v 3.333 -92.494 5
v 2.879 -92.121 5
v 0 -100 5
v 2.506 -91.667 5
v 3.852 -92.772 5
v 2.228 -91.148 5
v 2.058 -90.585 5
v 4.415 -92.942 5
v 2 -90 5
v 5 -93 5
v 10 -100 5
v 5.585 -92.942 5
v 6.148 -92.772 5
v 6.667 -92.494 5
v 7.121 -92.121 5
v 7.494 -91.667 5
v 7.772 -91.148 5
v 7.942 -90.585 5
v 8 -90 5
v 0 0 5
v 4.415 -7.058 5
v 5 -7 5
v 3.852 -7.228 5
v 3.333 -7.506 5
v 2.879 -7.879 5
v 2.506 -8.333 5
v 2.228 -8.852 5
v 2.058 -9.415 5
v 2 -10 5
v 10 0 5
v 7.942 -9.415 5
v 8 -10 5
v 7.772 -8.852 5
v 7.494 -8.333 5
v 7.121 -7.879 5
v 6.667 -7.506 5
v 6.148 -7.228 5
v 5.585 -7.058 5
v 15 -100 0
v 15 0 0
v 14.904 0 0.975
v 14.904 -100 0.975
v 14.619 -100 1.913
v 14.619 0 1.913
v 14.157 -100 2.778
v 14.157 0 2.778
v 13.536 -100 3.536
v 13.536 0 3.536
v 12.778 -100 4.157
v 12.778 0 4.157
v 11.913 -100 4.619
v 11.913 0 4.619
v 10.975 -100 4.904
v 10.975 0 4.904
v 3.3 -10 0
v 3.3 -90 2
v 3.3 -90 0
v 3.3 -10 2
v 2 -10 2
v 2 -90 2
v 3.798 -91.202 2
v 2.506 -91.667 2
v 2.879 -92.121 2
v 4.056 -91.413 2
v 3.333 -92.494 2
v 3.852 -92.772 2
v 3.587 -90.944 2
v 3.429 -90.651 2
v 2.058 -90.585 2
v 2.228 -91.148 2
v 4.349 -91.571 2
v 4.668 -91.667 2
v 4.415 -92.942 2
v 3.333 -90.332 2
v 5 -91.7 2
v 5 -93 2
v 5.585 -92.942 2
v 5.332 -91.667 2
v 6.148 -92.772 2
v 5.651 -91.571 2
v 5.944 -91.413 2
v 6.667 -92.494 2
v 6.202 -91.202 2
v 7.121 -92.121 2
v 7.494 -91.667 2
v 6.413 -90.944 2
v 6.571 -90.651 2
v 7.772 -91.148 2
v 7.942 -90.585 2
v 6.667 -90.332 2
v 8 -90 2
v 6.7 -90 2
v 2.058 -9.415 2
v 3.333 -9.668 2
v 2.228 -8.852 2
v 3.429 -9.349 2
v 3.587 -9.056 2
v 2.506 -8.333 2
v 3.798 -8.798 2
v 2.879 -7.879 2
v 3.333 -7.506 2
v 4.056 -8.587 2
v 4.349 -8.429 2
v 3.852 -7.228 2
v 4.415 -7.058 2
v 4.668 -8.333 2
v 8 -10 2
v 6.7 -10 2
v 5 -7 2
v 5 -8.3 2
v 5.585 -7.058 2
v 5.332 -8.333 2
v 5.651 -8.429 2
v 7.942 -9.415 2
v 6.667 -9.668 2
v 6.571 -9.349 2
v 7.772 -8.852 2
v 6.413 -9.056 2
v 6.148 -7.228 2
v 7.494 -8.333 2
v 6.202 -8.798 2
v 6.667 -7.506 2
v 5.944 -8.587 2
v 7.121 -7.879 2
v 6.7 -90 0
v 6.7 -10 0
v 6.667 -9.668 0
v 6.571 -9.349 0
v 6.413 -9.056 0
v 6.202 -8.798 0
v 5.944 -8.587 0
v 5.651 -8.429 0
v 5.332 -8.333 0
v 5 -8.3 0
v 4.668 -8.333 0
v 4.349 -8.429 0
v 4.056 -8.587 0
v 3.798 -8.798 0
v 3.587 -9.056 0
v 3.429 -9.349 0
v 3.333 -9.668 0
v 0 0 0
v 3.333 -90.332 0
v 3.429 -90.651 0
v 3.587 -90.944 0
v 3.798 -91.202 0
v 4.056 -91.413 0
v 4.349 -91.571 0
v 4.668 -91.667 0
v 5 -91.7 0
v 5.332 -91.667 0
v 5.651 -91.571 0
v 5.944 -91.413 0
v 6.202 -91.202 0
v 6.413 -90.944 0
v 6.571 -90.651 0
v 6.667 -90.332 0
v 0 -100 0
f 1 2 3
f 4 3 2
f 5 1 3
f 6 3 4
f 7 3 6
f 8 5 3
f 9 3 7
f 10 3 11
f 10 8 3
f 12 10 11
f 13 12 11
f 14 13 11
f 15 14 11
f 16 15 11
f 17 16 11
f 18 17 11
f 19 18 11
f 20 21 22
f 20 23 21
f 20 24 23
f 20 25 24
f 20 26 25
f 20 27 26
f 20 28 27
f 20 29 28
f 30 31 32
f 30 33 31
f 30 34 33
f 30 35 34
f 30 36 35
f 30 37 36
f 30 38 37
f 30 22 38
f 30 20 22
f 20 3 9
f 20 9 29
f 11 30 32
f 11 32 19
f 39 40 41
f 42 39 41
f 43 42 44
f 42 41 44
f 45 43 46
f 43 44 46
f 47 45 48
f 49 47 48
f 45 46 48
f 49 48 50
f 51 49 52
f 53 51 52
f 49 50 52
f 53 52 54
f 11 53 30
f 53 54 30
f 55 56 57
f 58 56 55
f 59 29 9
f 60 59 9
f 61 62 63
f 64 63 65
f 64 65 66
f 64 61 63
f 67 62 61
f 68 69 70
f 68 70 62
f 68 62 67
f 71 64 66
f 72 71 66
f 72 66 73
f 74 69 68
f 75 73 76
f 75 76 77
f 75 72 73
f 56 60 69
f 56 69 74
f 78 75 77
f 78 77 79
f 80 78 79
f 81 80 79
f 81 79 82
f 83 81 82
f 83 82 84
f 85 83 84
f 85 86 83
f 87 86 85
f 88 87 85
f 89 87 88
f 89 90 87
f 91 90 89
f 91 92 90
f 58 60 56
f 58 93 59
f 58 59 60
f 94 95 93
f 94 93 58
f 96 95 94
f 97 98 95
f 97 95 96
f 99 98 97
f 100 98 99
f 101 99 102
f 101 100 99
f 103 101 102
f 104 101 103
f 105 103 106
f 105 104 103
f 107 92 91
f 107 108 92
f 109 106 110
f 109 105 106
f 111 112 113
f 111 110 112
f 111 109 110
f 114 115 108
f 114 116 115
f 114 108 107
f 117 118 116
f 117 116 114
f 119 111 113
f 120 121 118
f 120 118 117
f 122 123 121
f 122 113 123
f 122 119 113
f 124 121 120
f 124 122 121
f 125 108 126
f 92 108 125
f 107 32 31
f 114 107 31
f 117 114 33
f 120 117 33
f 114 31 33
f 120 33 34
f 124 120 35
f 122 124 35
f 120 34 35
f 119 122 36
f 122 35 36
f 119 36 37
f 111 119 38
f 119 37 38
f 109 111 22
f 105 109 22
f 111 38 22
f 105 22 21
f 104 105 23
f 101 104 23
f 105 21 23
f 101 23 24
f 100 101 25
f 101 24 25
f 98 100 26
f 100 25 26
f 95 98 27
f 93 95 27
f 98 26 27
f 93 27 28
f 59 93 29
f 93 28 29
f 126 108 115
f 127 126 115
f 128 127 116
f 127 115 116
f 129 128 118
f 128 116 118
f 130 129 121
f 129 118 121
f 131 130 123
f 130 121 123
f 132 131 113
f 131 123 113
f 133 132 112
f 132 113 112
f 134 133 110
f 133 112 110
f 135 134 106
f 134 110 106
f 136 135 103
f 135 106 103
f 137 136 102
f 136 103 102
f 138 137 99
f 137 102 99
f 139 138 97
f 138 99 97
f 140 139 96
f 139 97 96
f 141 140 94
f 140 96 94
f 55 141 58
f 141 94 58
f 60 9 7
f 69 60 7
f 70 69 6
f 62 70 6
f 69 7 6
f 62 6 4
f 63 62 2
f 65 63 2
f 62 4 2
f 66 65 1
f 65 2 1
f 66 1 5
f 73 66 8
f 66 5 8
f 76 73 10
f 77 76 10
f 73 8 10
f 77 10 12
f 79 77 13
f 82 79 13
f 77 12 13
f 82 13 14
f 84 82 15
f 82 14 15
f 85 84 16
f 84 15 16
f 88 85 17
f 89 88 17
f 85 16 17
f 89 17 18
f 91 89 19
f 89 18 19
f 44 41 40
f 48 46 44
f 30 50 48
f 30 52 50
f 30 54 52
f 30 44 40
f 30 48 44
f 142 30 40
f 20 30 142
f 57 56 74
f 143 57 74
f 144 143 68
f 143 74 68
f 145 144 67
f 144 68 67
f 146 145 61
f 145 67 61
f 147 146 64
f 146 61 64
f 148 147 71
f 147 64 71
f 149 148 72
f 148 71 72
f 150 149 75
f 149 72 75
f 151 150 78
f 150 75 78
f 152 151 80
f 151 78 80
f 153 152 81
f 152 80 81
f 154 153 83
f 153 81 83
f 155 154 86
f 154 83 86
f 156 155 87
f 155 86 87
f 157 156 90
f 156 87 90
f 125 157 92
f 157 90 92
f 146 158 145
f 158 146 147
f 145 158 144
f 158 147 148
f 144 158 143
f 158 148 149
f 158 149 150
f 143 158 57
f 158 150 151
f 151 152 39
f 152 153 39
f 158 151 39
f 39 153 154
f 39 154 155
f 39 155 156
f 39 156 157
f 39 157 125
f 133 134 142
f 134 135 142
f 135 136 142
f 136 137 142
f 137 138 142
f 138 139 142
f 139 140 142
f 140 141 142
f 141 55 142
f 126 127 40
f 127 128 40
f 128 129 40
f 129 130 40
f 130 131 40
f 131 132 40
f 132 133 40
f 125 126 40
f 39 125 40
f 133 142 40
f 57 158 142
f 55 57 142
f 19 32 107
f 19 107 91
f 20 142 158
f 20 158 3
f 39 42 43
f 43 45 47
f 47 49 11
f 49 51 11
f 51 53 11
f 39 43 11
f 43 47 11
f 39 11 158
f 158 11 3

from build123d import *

# Parameters (mm, degrees)
PAD_DEPTH       = 100
POCKET_DEPTH    = 3
POCKET001_DEPTH = 3


with BuildPart() as part:
    # Sketch → Pad (new body)
    with BuildSketch(Plane.XZ):
        with BuildLine():
            Line((0, 0), (0, 5))
            Line((0, 5), (10, 5))
            ThreePointArc((14.999978, 0), (13.535519, 3.535526), (10, 5))
            Line((0, 0), (14.999978, 0))
        make_face()
    extrude(amount=PAD_DEPTH)

    # Sketch001 → Pocket (cut)
    with BuildSketch(Plane.XY.offset(5)):
        with BuildLine():
            ThreePointArc((8, -10), (5, -7), (2, -10))
            Line((2, -10), (2, -90))
            ThreePointArc((2, -90), (5, -93), (8, -90))
            Line((8, -10), (8, -90))
        make_face()
    extrude(amount=-POCKET_DEPTH, mode=Mode.SUBTRACT)

    # Sketch002 → Pocket001 (cut)
    with BuildSketch(Plane.XY.offset(2)):
        with BuildLine():
            Line((6.7, -10), (6.7, -90))
            ThreePointArc((3.3, -90), (5, -91.7), (6.7, -90))
            Line((3.3, -90), (3.3, -10))
            ThreePointArc((6.7, -10), (5, -8.3), (3.3, -10))
        make_face()
    extrude(amount=-POCKET001_DEPTH, mode=Mode.SUBTRACT)


solid = part.part
